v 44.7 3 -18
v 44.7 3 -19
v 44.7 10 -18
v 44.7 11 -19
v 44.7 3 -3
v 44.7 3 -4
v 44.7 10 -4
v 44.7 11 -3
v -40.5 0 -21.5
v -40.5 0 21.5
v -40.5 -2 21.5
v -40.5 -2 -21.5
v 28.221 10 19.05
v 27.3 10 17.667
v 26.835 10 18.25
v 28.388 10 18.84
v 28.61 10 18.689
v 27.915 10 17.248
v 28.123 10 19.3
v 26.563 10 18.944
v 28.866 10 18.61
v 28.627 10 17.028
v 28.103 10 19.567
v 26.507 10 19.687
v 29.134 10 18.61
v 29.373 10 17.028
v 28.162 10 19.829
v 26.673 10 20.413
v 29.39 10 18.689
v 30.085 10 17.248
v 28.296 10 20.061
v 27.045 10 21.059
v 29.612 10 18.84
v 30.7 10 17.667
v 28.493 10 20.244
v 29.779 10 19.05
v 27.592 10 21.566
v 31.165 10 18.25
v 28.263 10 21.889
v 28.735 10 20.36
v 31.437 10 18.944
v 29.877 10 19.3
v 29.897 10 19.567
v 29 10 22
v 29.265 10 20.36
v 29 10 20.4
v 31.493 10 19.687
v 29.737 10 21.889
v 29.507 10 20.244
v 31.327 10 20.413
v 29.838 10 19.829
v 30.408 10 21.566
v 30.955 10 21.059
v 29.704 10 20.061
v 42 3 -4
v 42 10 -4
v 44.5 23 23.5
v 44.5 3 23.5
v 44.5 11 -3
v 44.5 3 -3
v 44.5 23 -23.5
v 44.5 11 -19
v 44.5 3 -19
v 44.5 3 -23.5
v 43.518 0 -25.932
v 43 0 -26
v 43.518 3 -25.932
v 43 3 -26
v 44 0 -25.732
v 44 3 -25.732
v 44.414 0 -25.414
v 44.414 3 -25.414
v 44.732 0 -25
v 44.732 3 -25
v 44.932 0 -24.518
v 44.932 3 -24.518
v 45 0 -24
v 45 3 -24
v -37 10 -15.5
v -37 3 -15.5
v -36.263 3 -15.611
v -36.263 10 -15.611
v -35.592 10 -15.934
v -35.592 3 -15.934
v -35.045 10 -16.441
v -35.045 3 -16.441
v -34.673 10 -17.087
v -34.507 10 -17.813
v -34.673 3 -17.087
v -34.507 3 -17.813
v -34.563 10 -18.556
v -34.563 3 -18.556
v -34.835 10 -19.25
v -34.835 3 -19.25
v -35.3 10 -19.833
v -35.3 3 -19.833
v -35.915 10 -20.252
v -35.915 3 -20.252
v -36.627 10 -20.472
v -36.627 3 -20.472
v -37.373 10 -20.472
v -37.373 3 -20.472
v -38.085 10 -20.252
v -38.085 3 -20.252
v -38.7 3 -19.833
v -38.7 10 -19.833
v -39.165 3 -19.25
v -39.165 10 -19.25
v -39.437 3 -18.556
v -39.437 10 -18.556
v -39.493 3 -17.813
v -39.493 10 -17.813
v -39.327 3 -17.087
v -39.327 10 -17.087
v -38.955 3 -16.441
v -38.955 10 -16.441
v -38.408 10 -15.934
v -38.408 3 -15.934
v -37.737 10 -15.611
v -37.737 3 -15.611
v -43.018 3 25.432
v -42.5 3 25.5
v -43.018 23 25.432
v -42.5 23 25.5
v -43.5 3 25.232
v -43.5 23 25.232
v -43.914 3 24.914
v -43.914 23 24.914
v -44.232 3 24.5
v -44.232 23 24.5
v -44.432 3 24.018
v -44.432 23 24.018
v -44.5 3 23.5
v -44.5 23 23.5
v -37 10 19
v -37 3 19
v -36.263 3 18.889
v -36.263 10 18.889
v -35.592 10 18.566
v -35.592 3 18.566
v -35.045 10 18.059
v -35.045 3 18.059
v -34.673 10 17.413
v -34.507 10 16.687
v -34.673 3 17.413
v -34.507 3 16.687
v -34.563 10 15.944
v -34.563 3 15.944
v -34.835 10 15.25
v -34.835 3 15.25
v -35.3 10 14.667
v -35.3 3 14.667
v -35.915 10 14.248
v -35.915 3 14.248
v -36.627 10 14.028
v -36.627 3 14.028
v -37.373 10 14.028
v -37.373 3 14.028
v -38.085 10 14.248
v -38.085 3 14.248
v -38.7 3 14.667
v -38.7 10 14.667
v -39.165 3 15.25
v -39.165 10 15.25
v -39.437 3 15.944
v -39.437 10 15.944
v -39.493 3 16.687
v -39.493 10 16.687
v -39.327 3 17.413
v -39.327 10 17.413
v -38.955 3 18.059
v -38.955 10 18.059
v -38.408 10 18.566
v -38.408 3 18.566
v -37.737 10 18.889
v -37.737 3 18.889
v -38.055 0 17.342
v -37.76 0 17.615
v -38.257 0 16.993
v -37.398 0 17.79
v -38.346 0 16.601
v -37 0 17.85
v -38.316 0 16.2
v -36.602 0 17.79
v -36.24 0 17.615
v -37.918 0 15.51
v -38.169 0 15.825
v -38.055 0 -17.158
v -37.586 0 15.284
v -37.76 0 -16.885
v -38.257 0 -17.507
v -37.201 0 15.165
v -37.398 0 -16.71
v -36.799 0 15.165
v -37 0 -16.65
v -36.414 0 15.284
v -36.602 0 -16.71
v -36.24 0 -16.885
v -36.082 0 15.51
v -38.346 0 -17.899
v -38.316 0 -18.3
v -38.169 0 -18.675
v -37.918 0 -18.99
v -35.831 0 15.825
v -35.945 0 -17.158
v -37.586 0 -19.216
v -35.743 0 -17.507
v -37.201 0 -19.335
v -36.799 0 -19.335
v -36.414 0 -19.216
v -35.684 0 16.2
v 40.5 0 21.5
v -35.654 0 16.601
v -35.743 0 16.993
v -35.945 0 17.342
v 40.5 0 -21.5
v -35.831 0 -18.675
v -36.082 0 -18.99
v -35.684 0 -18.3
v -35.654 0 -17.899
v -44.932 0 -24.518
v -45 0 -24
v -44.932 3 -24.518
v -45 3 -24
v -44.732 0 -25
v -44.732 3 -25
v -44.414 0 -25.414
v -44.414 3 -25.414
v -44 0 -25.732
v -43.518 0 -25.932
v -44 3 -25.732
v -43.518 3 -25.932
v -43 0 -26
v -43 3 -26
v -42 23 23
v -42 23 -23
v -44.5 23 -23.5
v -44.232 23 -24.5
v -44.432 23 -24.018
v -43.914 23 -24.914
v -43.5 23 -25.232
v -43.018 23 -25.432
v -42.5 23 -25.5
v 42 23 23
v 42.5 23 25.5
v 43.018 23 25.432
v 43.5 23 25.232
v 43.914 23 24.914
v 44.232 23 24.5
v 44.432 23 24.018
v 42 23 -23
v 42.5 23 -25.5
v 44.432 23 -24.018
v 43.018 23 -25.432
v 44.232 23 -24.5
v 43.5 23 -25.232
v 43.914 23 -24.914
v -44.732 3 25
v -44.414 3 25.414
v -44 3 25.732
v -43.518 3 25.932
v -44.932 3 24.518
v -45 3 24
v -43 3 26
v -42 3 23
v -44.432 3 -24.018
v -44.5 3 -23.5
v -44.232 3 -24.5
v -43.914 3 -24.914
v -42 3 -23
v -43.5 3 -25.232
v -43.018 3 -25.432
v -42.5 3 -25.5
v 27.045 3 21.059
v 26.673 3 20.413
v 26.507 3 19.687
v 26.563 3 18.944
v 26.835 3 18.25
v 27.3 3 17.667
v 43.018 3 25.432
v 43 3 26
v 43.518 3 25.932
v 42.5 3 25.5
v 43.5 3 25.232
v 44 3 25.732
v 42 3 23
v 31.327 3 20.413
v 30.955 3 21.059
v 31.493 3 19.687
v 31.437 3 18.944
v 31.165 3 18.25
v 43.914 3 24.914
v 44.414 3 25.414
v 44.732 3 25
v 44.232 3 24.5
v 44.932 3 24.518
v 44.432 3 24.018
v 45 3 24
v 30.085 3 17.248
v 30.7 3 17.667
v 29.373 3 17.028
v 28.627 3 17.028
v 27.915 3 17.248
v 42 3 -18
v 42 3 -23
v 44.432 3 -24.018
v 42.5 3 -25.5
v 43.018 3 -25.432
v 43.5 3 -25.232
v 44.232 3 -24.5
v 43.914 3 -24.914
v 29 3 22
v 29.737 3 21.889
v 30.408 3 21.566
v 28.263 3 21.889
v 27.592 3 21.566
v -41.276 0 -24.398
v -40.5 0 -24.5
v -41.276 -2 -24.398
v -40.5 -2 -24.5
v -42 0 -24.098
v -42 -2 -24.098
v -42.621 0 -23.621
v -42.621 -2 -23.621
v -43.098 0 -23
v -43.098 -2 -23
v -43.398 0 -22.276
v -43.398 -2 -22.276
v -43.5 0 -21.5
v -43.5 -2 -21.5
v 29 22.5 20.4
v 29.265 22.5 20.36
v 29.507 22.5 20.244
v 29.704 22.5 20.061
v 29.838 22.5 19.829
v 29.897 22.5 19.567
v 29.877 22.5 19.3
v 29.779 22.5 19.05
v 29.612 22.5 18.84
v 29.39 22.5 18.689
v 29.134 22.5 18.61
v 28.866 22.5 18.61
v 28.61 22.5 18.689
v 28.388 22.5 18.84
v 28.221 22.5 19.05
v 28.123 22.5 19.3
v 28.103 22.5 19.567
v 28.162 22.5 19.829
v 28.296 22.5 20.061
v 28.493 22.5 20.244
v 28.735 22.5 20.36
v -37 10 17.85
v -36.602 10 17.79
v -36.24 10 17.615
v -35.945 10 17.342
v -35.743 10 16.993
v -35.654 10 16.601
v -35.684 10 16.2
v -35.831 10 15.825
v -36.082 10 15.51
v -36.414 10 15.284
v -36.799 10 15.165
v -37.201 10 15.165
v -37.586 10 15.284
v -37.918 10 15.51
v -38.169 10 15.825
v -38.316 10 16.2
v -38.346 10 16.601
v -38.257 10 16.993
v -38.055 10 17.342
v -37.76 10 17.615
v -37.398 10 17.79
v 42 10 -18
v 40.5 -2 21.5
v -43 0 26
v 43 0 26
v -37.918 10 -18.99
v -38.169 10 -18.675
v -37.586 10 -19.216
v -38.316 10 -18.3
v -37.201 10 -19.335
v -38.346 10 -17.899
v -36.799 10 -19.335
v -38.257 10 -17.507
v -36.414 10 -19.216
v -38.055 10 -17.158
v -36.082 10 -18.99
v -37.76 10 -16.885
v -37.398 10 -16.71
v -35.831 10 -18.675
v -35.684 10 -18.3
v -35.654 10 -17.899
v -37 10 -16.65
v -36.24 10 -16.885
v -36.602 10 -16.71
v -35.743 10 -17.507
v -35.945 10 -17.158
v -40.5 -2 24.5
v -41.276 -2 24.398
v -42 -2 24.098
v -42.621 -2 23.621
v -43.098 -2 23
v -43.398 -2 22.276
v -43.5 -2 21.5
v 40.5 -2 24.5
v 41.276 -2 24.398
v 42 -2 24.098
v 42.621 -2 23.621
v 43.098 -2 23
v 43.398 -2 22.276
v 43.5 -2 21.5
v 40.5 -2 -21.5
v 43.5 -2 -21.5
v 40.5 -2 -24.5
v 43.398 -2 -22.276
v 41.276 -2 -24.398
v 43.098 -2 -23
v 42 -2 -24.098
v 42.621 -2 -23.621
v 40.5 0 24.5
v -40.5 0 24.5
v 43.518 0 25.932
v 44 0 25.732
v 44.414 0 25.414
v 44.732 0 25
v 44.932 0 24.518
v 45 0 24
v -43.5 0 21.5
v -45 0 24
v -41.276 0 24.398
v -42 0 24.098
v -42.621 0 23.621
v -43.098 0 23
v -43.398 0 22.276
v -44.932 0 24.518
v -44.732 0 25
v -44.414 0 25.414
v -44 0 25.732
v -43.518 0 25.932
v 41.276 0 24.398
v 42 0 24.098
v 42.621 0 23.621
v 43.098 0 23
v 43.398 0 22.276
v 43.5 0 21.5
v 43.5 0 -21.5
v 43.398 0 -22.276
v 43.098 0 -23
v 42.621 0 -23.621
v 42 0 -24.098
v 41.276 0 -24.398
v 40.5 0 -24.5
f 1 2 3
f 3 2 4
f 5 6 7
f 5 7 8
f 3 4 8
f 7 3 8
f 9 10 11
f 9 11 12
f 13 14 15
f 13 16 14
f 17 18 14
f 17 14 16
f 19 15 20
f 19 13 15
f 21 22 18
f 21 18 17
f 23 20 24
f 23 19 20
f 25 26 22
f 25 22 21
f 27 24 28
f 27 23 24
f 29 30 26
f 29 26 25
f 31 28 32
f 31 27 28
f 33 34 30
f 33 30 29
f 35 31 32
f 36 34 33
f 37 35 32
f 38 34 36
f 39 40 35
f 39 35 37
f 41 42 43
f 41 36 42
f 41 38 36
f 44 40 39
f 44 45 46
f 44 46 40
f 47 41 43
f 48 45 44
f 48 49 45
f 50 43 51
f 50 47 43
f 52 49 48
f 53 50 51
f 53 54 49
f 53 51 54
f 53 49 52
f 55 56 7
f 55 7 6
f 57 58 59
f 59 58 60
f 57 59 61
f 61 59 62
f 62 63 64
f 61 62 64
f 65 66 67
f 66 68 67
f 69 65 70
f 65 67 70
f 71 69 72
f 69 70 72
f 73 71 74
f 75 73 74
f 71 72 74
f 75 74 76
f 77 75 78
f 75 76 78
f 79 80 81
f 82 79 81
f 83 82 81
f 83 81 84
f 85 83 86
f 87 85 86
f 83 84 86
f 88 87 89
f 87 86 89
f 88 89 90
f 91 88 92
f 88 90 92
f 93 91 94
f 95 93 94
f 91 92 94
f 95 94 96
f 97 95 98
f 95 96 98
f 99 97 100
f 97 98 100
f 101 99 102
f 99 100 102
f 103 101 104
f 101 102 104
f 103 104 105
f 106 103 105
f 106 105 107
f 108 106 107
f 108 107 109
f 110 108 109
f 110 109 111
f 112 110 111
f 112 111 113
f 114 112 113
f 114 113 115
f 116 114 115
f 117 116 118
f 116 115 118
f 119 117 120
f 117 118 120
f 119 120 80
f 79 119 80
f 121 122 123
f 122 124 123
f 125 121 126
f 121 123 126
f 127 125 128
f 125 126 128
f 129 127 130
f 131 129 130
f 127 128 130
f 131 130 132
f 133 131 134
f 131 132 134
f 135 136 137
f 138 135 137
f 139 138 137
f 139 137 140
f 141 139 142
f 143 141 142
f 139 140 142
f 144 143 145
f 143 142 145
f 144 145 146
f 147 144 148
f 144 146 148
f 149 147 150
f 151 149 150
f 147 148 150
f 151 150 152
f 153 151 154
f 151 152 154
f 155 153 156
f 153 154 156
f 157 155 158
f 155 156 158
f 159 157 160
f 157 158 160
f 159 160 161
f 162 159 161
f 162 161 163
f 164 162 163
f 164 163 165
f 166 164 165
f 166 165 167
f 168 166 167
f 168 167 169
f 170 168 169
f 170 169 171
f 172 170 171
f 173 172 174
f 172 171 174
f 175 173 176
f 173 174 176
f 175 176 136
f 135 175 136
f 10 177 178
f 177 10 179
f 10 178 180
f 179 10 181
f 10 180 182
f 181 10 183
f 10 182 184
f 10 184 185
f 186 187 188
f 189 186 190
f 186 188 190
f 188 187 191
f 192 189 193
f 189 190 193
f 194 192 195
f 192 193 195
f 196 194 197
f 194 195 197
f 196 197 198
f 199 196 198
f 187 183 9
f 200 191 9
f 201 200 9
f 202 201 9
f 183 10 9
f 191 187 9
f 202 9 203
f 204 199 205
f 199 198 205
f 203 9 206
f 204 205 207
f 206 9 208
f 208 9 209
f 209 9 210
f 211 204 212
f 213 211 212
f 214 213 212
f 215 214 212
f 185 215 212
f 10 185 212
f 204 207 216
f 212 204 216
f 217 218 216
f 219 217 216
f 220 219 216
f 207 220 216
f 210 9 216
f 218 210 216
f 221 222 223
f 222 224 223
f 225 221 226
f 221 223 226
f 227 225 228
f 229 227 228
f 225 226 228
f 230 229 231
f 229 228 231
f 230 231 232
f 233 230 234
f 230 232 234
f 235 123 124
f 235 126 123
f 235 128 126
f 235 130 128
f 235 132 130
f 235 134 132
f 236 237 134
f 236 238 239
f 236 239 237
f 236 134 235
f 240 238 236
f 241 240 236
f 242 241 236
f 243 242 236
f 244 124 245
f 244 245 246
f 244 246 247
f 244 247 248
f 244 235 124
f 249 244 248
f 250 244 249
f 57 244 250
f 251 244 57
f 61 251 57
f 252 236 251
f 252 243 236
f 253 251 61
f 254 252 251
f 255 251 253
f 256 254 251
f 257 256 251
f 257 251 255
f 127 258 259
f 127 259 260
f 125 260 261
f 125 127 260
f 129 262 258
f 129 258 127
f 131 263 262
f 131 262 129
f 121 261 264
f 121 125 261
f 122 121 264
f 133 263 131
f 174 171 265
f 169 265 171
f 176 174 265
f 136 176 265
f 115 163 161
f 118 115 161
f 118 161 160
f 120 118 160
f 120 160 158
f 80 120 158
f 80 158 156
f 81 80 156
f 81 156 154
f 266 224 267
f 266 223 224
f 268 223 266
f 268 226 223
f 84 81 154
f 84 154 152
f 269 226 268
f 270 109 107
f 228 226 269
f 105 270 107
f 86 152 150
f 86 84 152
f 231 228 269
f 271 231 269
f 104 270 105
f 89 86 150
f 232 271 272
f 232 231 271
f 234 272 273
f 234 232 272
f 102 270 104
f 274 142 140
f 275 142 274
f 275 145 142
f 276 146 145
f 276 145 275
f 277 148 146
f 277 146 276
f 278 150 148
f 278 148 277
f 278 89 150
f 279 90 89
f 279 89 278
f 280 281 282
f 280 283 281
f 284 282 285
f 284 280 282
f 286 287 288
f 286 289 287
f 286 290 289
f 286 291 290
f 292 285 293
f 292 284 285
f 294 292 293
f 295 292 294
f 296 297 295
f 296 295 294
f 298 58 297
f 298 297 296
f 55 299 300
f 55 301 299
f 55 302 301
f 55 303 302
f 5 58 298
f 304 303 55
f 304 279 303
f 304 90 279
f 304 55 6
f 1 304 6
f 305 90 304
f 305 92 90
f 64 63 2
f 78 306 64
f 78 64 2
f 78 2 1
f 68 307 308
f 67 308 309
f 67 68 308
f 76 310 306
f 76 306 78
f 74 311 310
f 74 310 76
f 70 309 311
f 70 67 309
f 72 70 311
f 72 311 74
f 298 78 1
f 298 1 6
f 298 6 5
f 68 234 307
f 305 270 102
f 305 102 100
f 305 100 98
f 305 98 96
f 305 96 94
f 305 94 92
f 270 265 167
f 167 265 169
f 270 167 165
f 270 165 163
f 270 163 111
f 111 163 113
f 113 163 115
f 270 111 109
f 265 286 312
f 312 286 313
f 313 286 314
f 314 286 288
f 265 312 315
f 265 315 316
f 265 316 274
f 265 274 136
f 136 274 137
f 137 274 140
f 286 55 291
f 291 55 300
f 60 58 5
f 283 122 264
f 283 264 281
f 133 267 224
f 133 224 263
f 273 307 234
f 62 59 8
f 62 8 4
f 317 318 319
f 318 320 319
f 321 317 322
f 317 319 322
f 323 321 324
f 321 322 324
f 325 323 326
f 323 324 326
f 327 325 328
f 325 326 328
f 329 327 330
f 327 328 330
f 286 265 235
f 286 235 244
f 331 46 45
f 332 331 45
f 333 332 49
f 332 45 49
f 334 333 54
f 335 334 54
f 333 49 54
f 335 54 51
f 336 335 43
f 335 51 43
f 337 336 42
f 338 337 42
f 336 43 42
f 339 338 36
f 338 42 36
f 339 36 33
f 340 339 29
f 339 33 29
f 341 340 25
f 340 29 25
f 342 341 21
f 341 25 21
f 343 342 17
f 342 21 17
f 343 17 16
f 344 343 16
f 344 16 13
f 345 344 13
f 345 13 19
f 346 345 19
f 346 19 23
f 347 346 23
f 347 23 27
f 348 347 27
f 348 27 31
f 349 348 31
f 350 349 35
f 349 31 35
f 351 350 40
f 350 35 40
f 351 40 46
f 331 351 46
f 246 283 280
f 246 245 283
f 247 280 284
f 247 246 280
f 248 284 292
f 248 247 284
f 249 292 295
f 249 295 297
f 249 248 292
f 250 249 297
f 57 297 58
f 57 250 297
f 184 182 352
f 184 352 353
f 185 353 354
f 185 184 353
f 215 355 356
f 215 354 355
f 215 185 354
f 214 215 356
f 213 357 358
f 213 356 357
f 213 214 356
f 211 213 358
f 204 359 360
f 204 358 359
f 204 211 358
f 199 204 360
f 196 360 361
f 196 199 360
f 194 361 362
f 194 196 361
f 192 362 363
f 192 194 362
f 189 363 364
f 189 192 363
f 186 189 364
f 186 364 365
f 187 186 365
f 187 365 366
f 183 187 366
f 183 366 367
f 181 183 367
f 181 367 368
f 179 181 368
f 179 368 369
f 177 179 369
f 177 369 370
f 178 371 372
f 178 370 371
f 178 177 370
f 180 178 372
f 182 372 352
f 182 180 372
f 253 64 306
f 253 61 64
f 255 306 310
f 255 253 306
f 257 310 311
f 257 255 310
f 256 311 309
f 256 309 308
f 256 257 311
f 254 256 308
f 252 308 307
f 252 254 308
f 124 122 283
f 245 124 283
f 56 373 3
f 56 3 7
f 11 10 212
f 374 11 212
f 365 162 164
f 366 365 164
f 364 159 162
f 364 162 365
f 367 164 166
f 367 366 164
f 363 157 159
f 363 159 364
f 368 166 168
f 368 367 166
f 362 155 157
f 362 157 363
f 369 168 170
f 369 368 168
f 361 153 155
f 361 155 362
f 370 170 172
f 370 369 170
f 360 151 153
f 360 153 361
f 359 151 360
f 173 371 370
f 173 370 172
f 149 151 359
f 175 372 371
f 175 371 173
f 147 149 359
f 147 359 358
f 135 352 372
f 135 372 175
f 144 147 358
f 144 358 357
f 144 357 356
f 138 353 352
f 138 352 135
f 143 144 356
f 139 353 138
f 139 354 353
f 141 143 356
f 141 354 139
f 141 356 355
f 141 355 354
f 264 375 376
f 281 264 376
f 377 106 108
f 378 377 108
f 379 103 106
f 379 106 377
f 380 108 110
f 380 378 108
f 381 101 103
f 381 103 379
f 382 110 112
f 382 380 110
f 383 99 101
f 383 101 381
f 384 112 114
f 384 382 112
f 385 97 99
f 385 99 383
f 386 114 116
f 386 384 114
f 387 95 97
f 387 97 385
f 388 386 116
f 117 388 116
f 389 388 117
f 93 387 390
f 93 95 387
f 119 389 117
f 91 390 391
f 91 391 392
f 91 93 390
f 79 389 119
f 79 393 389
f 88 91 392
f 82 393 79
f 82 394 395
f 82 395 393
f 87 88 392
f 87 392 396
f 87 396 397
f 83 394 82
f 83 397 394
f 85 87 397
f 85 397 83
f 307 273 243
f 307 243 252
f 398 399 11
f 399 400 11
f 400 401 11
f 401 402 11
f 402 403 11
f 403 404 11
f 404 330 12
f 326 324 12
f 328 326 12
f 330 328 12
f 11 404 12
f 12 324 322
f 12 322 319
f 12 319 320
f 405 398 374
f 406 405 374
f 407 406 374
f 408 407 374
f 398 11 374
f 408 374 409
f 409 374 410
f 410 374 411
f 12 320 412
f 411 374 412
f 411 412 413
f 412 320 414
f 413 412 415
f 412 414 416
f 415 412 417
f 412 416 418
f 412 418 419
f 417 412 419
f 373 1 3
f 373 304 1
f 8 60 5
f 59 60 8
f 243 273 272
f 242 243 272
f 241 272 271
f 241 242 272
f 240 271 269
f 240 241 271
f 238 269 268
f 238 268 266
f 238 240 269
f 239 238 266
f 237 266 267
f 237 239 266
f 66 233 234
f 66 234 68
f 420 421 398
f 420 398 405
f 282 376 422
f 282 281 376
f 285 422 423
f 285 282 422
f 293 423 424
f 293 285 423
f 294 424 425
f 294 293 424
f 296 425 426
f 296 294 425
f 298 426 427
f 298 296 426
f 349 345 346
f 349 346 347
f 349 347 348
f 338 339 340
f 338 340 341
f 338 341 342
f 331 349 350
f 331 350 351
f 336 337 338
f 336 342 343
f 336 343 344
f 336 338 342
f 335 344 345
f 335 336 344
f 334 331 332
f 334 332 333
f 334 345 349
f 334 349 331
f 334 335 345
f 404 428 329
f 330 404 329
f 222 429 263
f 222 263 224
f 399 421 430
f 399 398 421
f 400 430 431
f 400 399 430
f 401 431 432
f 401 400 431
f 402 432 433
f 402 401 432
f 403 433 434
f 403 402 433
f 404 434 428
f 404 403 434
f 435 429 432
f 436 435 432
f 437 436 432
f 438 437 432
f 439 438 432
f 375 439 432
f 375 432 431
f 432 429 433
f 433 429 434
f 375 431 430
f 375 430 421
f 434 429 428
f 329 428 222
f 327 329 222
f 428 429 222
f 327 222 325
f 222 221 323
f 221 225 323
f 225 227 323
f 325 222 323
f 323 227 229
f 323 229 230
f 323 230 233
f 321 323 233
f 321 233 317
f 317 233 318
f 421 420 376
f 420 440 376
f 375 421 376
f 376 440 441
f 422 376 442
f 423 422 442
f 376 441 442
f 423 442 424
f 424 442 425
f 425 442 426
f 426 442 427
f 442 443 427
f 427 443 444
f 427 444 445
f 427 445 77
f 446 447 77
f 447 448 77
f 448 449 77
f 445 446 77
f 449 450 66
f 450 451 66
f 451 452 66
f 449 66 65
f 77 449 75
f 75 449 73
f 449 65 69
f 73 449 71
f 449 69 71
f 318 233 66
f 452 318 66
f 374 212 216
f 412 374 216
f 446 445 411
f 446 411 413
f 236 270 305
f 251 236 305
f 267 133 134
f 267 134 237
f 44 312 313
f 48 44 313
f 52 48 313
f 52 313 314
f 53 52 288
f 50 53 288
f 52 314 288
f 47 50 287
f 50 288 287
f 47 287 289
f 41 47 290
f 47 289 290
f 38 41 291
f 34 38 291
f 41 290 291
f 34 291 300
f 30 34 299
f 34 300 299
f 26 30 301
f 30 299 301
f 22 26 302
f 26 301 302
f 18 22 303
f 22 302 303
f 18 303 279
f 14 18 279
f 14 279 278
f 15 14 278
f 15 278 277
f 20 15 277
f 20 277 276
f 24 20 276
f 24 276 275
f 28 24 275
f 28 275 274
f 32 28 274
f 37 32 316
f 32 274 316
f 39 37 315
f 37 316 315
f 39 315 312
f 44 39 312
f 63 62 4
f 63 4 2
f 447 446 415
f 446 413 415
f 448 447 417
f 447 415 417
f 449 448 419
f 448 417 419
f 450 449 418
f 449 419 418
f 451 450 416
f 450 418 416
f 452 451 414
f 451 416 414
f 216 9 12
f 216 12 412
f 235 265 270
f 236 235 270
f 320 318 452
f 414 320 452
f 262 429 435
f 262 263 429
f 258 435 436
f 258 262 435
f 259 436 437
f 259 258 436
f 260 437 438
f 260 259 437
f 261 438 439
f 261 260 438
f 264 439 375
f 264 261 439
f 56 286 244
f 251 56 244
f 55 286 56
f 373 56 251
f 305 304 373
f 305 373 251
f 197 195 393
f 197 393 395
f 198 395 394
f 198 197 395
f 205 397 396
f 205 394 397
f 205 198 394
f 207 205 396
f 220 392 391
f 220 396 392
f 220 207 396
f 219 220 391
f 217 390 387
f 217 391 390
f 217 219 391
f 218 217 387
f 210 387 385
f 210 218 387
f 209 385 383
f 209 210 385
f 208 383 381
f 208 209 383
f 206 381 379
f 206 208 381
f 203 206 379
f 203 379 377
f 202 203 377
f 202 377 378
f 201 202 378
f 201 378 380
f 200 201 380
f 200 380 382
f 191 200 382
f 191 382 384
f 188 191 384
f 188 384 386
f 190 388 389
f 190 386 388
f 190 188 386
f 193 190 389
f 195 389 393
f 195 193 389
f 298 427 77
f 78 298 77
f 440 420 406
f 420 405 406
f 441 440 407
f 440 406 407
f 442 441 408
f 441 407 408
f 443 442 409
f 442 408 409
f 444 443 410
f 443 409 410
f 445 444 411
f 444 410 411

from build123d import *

# Parameters (mm, degrees)
SKETCH1_W               = 90
SKETCH1_H               = 52
BOSS_EXTRUDE1_DEPTH     = 3
BOSS_EXTRUDE2_START     = 3
SKETCH4_R               = 2.5
BOSS_EXTRUDE2_DEPTH     = 7
CUT_EXTRUDE2_DEPTH      = 53.92447449
CUT_EXTRUDE2_DEPTH_BACK = 63.92447449
CUT_EXTRUDE2_START      = 10
SKETCH5_R               = 1.35
BOSS_EXTRUDE3_START     = 10
SKETCH6_R               = 0.9
BOSS_EXTRUDE3_DEPTH     = 12.5
SKETCH7_W               = 87
SKETCH7_H               = 49
SKETCH7_W_2             = 81
SKETCH7_H_2             = 43
BOSS_EXTRUDE4_DEPTH     = 2
FILLET1_R               = 3
BOSS_EXTRUDE8_START     = 3
SKETCH8_W               = 89
SKETCH8_H               = 51
SKETCH8_W_2             = 84
SKETCH8_H_2             = 46
BOSS_EXTRUDE8_DEPTH     = 20
FILLET2_R               = 2
CUT_EXTRUDE3_START      = 42
SKETCH9_W               = 14
SKETCH9_H               = 7
CUT_EXTRUDE3_DEPTH      = 15
BOSS_EXTRUDE9_START     = 44.5
BOSS_EXTRUDE9_DEPTH     = 0.2


with BuildPart() as part:
    # Sketch1 → Boss-Extrude1 (new body)
    with BuildSketch(Plane(origin=(0, 0, 0), x_dir=(1, 0, 0), z_dir=(0, 1, 0))):
        Rectangle(SKETCH1_W, SKETCH1_H)
    extrude(amount=BOSS_EXTRUDE1_DEPTH)

    # Sketch4 → Boss-Extrude2 (add)
    with BuildSketch(Plane(origin=(0, 0, 0), x_dir=(1, 0, 0), z_dir=(0, 1, 0)).offset(BOSS_EXTRUDE2_START)):
        with Locations(Location((29, -19.5, 0), (0, 0, 270))):
            Circle(SKETCH4_R)
        with Locations(Location((-37, 18, 0), (0, 0, 270))):
            Circle(SKETCH4_R)
        with Locations(Location((-37, -16.5, 0), (0, 0, 270))):
            Circle(SKETCH4_R)
    extrude(amount=BOSS_EXTRUDE2_DEPTH)

    # Sketch5 → Cut-Extrude2 (cut, two sides: drawn at the far end of the back side and taken through both)
    with BuildSketch(Plane(origin=(0, 0, 0), x_dir=(1, 0, 0), z_dir=(0, 1, 0)).offset(CUT_EXTRUDE2_START - CUT_EXTRUDE2_DEPTH_BACK)):
        with Locations(Location((-37, 18, 0), (0, 0, 270))):
            Circle(SKETCH5_R)
        with Locations(Location((-37, -16.5, 0), (0, 0, 270))):
            Circle(SKETCH5_R)
    extrude(amount=CUT_EXTRUDE2_DEPTH + CUT_EXTRUDE2_DEPTH_BACK, mode=Mode.SUBTRACT)

    # Sketch6 → Boss-Extrude3 (add)
    with BuildSketch(Plane(origin=(0, 0, 0), x_dir=(1, 0, 0), z_dir=(0, 1, 0)).offset(BOSS_EXTRUDE3_START)):
        with Locations(Location((29, -19.5, 0), (0, 0, 270))):
            Circle(SKETCH6_R)
    extrude(amount=BOSS_EXTRUDE3_DEPTH)

    # Sketch7 → Boss-Extrude4 (add)
    with BuildSketch(Plane(origin=(0, 0, 0), x_dir=(1, 0, 0), z_dir=(0, 1, 0))):
        Rectangle(SKETCH7_W, SKETCH7_H)
        Rectangle(SKETCH7_W_2, SKETCH7_H_2, mode=Mode.SUBTRACT)
    extrude(amount=-BOSS_EXTRUDE4_DEPTH)

    # Fillet1
    fillet1_edges = [part.edges().sort_by_distance(p)[0] for p in [
        (43.5, -1, -24.5),
        (43.5, -1, 24.5),
        (-43.5, -1, 24.5),
        (-43.5, -1, -24.5),
    ]]
    fillet(fillet1_edges, radius=FILLET1_R)

    # Sketch8 → Boss-Extrude8 (add)
    with BuildSketch(Plane(origin=(0, 0, 0), x_dir=(1, 0, 0), z_dir=(0, 1, 0)).offset(BOSS_EXTRUDE8_START)):
        Rectangle(SKETCH8_W, SKETCH8_H)
        Rectangle(SKETCH8_W_2, SKETCH8_H_2, mode=Mode.SUBTRACT)
    extrude(amount=BOSS_EXTRUDE8_DEPTH)

    # Fillet2
    fillet2_edges = [part.edges().sort_by_distance(p)[0] for p in [
        (44.5, 13, -25.5),
        (-44.5, 13, -25.5),
        (-44.5, 13, 25.5),
        (44.5, 13, 25.5),
        (-45, 1.5, -26),
        (45, 1.5, -26),
        (45, 1.5, 26),
        (-45, 1.5, 26),
    ]]
    fillet(fillet2_edges, radius=FILLET2_R)

    # Sketch9 → Cut-Extrude3 (cut)
    with BuildSketch(Plane(origin=(0, 0, 0), x_dir=(0, 0, -1), z_dir=(1, 0, 0)).offset(CUT_EXTRUDE3_START)):
        with Locations((11, 6.5)):
            Rectangle(SKETCH9_W, SKETCH9_H)
    extrude(amount=CUT_EXTRUDE3_DEPTH, mode=Mode.SUBTRACT)

    # Sketch10 → Boss-Extrude9 (add)
    with BuildSketch(Plane(origin=(0, 0, 0), x_dir=(0, 0, -1), z_dir=(1, 0, 0)).offset(BOSS_EXTRUDE9_START)):
        Polygon((18, 3), (18, 10), (4, 10), (4, 3), (3, 3), (3, 11), (19, 11), (19, 3), align=None)
    extrude(amount=BOSS_EXTRUDE9_DEPTH)


solid = part.part
